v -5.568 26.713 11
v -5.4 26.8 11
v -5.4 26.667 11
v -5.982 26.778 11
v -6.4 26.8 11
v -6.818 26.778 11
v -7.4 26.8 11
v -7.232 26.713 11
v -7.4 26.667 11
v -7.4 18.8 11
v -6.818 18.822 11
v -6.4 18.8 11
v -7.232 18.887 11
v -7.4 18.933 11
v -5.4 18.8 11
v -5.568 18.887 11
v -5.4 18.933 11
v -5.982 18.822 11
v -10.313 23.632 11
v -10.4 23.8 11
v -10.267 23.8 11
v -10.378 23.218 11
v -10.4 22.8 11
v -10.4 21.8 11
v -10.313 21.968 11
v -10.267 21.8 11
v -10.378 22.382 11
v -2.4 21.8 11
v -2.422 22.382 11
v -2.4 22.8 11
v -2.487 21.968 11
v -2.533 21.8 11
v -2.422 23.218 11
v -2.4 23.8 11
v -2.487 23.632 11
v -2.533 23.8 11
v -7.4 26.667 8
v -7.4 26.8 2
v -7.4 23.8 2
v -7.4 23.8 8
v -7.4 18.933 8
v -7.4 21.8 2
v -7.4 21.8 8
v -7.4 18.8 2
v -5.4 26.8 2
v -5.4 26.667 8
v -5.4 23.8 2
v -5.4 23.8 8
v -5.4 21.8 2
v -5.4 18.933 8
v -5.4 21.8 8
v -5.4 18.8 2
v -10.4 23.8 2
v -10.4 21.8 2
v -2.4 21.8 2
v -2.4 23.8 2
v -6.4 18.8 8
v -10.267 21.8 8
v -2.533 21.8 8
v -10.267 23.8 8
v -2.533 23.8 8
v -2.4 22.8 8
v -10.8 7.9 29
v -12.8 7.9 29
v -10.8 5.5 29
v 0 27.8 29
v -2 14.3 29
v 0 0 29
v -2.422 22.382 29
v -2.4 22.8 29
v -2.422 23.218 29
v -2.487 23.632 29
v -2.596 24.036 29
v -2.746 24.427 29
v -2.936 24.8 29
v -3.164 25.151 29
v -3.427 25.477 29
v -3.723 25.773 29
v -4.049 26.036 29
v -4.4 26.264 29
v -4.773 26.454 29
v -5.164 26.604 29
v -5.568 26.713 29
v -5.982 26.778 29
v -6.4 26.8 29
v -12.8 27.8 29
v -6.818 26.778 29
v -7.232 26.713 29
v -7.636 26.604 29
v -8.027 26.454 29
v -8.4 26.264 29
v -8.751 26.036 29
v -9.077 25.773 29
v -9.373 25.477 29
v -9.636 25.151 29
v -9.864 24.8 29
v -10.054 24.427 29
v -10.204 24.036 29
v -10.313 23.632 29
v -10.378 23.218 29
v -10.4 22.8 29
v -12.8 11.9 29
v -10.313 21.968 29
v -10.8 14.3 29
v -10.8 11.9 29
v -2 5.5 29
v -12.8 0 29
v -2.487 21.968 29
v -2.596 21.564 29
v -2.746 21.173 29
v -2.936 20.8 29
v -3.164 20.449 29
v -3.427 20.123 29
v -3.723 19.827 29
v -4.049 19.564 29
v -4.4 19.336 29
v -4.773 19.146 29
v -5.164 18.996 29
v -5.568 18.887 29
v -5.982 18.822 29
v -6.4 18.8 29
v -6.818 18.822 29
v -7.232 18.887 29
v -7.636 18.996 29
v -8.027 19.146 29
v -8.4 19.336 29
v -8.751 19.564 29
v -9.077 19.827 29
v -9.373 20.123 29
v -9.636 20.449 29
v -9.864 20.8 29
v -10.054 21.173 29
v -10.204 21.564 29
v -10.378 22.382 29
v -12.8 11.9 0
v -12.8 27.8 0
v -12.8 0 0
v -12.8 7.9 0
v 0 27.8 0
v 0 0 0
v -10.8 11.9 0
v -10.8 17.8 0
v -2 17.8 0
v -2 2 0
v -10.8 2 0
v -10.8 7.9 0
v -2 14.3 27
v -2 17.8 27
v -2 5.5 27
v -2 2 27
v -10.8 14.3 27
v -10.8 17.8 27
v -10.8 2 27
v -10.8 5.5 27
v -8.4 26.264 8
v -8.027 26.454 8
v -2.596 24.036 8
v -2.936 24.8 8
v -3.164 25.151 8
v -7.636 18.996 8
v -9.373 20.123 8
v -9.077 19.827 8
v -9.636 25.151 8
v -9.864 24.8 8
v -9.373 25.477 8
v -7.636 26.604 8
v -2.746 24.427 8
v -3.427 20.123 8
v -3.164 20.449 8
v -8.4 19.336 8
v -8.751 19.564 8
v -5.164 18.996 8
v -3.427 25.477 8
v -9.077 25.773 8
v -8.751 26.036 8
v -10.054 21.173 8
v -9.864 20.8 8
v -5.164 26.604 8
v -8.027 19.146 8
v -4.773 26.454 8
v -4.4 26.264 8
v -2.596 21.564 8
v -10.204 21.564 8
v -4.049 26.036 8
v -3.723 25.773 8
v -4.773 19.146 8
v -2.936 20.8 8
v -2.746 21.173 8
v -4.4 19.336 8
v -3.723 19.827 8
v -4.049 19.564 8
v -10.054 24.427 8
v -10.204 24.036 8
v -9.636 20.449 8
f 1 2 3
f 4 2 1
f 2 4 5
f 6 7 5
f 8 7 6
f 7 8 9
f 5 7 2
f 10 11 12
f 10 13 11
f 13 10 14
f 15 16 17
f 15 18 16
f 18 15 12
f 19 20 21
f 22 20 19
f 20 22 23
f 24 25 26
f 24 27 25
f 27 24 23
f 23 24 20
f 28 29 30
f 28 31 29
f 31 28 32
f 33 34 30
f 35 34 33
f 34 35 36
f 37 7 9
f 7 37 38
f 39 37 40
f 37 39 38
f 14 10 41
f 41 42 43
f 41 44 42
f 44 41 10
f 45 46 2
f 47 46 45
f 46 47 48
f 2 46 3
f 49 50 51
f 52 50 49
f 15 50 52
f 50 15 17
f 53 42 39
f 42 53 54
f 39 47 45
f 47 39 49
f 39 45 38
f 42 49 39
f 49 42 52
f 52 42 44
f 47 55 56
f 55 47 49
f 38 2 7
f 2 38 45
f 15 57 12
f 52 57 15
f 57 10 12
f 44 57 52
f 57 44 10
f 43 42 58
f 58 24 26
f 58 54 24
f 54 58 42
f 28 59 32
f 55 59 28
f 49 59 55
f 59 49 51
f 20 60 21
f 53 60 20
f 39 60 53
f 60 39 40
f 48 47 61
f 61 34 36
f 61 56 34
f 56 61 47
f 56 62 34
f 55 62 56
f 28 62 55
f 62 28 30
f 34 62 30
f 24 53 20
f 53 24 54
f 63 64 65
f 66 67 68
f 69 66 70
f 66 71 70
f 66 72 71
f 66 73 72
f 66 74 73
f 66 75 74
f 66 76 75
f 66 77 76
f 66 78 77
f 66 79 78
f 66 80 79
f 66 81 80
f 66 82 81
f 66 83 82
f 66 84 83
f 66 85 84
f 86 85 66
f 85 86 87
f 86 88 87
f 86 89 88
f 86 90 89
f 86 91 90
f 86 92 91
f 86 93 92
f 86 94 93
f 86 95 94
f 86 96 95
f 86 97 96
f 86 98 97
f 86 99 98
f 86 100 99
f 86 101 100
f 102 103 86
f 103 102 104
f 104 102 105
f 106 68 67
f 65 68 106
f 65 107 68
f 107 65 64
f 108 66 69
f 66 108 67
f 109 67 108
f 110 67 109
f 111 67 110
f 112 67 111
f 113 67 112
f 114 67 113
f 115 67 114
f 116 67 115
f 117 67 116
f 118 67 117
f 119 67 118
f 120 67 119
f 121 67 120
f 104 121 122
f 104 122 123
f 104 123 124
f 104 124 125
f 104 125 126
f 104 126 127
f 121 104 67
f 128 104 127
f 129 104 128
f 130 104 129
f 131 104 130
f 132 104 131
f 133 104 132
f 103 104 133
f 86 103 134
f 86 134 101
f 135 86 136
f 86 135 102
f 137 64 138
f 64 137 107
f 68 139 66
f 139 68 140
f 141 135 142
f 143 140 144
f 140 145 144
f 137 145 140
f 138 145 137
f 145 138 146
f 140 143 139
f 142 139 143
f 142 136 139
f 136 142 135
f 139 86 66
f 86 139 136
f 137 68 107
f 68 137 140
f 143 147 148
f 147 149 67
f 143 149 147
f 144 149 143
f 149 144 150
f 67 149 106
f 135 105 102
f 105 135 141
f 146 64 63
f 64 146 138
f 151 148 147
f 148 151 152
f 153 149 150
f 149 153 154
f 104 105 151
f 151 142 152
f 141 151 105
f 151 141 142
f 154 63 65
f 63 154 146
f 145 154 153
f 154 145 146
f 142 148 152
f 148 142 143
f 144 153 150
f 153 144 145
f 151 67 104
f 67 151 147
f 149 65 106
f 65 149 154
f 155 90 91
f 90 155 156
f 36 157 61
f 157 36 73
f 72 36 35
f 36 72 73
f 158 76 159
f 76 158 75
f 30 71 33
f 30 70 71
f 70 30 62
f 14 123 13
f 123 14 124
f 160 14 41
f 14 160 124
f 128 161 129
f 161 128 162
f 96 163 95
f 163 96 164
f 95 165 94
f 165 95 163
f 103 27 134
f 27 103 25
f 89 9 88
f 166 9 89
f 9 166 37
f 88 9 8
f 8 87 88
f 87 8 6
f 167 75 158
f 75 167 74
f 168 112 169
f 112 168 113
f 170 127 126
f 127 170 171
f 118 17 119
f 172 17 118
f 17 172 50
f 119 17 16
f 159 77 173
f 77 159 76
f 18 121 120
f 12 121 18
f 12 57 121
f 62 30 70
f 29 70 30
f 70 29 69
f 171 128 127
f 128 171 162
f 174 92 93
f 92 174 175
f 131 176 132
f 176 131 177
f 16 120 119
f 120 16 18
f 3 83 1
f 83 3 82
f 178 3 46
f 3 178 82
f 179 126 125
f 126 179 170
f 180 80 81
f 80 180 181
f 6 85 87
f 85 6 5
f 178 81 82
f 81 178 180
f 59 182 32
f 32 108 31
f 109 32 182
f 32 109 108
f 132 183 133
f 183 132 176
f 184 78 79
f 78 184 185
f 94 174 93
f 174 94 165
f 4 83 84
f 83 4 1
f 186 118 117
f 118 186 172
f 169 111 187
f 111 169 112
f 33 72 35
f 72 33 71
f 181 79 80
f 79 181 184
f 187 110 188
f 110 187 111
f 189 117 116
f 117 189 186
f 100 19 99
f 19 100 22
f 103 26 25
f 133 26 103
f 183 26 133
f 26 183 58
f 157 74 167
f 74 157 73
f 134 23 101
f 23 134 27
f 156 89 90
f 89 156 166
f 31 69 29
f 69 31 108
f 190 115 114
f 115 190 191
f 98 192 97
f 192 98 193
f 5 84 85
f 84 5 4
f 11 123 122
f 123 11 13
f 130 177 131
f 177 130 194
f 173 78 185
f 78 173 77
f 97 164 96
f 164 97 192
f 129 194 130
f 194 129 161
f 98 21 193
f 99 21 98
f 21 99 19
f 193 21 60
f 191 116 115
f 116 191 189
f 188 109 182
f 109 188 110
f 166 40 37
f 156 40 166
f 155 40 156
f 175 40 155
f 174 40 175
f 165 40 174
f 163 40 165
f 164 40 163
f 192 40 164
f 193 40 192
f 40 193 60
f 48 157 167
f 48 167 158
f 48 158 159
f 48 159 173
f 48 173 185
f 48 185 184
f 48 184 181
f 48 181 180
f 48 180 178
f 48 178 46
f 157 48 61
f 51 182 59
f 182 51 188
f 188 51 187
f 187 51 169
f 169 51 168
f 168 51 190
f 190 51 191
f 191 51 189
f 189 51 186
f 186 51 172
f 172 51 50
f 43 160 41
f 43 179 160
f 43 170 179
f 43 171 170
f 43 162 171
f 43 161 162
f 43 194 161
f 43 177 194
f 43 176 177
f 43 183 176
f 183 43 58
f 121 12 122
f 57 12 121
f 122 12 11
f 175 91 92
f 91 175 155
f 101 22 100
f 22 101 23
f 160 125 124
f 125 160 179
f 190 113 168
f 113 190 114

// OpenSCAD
//count of fragments for cylinders etc.
$fn=60;
//plug dimensions (including 1mm tolerance)
PLen=27; 
//width and height - for perfect sit, file down (including 0.8mm tolerance)
PWit=15.8;
PHig=8.8;
//cable diameter
CDia=4; 
//additional cutout right (including 0.8mm tolerance)
ACutR=8.8; 
//screwdriver/stick diameter (including 1mm tolerance)
StDia=8;

rotate([0,270,0]) //suggested print orientation - alternatively enable print support below - hint: if you print in other direction, possibly you have to change the tolerances
difference(){
    translate([0,0,0])
    cube([PLen+2,PWit+4+StDia,PHig+4]);
    
    //cable
    translate([-5,PWit/2,2])
    cube([PLen+12,CDia,PHig+4]);
    
    //plug
    translate([-2,2,2])
    cube([PLen+2,PWit,PHig]);
    
    //additional cutout right
    translate([10,(PWit+4-ACutR)/2,(PHig+4-ACutR)/2])
    cube([PLen,ACutR,ACutR]);
    
    //hole for stick
    translate([StDia,PWit+3+StDia/2,(PHig+4)/2])
    rotate([0,90,0])
    cylinder(h=PLen,d=StDia);
    //slits
    translate([2,PWit+3,PHig/2+1]){
        cube([StDia+1,StDia,2]);
        translate([0,StDia/2+1,-(StDia)/2+1])
        rotate([90,0,0])
        cube([StDia+1,StDia,2]);
    }
}

/*/print support inside
translate([3,4,2.8])
PrnSupport(PLen-6,PWit-4,PHig-1,5); //*/

module PrnSupport(x,y,z,step) {
    for (xl=[0:step:x]) {
        translate([xl,0,0])
        cube([0.5,y,z]);
    }
}

